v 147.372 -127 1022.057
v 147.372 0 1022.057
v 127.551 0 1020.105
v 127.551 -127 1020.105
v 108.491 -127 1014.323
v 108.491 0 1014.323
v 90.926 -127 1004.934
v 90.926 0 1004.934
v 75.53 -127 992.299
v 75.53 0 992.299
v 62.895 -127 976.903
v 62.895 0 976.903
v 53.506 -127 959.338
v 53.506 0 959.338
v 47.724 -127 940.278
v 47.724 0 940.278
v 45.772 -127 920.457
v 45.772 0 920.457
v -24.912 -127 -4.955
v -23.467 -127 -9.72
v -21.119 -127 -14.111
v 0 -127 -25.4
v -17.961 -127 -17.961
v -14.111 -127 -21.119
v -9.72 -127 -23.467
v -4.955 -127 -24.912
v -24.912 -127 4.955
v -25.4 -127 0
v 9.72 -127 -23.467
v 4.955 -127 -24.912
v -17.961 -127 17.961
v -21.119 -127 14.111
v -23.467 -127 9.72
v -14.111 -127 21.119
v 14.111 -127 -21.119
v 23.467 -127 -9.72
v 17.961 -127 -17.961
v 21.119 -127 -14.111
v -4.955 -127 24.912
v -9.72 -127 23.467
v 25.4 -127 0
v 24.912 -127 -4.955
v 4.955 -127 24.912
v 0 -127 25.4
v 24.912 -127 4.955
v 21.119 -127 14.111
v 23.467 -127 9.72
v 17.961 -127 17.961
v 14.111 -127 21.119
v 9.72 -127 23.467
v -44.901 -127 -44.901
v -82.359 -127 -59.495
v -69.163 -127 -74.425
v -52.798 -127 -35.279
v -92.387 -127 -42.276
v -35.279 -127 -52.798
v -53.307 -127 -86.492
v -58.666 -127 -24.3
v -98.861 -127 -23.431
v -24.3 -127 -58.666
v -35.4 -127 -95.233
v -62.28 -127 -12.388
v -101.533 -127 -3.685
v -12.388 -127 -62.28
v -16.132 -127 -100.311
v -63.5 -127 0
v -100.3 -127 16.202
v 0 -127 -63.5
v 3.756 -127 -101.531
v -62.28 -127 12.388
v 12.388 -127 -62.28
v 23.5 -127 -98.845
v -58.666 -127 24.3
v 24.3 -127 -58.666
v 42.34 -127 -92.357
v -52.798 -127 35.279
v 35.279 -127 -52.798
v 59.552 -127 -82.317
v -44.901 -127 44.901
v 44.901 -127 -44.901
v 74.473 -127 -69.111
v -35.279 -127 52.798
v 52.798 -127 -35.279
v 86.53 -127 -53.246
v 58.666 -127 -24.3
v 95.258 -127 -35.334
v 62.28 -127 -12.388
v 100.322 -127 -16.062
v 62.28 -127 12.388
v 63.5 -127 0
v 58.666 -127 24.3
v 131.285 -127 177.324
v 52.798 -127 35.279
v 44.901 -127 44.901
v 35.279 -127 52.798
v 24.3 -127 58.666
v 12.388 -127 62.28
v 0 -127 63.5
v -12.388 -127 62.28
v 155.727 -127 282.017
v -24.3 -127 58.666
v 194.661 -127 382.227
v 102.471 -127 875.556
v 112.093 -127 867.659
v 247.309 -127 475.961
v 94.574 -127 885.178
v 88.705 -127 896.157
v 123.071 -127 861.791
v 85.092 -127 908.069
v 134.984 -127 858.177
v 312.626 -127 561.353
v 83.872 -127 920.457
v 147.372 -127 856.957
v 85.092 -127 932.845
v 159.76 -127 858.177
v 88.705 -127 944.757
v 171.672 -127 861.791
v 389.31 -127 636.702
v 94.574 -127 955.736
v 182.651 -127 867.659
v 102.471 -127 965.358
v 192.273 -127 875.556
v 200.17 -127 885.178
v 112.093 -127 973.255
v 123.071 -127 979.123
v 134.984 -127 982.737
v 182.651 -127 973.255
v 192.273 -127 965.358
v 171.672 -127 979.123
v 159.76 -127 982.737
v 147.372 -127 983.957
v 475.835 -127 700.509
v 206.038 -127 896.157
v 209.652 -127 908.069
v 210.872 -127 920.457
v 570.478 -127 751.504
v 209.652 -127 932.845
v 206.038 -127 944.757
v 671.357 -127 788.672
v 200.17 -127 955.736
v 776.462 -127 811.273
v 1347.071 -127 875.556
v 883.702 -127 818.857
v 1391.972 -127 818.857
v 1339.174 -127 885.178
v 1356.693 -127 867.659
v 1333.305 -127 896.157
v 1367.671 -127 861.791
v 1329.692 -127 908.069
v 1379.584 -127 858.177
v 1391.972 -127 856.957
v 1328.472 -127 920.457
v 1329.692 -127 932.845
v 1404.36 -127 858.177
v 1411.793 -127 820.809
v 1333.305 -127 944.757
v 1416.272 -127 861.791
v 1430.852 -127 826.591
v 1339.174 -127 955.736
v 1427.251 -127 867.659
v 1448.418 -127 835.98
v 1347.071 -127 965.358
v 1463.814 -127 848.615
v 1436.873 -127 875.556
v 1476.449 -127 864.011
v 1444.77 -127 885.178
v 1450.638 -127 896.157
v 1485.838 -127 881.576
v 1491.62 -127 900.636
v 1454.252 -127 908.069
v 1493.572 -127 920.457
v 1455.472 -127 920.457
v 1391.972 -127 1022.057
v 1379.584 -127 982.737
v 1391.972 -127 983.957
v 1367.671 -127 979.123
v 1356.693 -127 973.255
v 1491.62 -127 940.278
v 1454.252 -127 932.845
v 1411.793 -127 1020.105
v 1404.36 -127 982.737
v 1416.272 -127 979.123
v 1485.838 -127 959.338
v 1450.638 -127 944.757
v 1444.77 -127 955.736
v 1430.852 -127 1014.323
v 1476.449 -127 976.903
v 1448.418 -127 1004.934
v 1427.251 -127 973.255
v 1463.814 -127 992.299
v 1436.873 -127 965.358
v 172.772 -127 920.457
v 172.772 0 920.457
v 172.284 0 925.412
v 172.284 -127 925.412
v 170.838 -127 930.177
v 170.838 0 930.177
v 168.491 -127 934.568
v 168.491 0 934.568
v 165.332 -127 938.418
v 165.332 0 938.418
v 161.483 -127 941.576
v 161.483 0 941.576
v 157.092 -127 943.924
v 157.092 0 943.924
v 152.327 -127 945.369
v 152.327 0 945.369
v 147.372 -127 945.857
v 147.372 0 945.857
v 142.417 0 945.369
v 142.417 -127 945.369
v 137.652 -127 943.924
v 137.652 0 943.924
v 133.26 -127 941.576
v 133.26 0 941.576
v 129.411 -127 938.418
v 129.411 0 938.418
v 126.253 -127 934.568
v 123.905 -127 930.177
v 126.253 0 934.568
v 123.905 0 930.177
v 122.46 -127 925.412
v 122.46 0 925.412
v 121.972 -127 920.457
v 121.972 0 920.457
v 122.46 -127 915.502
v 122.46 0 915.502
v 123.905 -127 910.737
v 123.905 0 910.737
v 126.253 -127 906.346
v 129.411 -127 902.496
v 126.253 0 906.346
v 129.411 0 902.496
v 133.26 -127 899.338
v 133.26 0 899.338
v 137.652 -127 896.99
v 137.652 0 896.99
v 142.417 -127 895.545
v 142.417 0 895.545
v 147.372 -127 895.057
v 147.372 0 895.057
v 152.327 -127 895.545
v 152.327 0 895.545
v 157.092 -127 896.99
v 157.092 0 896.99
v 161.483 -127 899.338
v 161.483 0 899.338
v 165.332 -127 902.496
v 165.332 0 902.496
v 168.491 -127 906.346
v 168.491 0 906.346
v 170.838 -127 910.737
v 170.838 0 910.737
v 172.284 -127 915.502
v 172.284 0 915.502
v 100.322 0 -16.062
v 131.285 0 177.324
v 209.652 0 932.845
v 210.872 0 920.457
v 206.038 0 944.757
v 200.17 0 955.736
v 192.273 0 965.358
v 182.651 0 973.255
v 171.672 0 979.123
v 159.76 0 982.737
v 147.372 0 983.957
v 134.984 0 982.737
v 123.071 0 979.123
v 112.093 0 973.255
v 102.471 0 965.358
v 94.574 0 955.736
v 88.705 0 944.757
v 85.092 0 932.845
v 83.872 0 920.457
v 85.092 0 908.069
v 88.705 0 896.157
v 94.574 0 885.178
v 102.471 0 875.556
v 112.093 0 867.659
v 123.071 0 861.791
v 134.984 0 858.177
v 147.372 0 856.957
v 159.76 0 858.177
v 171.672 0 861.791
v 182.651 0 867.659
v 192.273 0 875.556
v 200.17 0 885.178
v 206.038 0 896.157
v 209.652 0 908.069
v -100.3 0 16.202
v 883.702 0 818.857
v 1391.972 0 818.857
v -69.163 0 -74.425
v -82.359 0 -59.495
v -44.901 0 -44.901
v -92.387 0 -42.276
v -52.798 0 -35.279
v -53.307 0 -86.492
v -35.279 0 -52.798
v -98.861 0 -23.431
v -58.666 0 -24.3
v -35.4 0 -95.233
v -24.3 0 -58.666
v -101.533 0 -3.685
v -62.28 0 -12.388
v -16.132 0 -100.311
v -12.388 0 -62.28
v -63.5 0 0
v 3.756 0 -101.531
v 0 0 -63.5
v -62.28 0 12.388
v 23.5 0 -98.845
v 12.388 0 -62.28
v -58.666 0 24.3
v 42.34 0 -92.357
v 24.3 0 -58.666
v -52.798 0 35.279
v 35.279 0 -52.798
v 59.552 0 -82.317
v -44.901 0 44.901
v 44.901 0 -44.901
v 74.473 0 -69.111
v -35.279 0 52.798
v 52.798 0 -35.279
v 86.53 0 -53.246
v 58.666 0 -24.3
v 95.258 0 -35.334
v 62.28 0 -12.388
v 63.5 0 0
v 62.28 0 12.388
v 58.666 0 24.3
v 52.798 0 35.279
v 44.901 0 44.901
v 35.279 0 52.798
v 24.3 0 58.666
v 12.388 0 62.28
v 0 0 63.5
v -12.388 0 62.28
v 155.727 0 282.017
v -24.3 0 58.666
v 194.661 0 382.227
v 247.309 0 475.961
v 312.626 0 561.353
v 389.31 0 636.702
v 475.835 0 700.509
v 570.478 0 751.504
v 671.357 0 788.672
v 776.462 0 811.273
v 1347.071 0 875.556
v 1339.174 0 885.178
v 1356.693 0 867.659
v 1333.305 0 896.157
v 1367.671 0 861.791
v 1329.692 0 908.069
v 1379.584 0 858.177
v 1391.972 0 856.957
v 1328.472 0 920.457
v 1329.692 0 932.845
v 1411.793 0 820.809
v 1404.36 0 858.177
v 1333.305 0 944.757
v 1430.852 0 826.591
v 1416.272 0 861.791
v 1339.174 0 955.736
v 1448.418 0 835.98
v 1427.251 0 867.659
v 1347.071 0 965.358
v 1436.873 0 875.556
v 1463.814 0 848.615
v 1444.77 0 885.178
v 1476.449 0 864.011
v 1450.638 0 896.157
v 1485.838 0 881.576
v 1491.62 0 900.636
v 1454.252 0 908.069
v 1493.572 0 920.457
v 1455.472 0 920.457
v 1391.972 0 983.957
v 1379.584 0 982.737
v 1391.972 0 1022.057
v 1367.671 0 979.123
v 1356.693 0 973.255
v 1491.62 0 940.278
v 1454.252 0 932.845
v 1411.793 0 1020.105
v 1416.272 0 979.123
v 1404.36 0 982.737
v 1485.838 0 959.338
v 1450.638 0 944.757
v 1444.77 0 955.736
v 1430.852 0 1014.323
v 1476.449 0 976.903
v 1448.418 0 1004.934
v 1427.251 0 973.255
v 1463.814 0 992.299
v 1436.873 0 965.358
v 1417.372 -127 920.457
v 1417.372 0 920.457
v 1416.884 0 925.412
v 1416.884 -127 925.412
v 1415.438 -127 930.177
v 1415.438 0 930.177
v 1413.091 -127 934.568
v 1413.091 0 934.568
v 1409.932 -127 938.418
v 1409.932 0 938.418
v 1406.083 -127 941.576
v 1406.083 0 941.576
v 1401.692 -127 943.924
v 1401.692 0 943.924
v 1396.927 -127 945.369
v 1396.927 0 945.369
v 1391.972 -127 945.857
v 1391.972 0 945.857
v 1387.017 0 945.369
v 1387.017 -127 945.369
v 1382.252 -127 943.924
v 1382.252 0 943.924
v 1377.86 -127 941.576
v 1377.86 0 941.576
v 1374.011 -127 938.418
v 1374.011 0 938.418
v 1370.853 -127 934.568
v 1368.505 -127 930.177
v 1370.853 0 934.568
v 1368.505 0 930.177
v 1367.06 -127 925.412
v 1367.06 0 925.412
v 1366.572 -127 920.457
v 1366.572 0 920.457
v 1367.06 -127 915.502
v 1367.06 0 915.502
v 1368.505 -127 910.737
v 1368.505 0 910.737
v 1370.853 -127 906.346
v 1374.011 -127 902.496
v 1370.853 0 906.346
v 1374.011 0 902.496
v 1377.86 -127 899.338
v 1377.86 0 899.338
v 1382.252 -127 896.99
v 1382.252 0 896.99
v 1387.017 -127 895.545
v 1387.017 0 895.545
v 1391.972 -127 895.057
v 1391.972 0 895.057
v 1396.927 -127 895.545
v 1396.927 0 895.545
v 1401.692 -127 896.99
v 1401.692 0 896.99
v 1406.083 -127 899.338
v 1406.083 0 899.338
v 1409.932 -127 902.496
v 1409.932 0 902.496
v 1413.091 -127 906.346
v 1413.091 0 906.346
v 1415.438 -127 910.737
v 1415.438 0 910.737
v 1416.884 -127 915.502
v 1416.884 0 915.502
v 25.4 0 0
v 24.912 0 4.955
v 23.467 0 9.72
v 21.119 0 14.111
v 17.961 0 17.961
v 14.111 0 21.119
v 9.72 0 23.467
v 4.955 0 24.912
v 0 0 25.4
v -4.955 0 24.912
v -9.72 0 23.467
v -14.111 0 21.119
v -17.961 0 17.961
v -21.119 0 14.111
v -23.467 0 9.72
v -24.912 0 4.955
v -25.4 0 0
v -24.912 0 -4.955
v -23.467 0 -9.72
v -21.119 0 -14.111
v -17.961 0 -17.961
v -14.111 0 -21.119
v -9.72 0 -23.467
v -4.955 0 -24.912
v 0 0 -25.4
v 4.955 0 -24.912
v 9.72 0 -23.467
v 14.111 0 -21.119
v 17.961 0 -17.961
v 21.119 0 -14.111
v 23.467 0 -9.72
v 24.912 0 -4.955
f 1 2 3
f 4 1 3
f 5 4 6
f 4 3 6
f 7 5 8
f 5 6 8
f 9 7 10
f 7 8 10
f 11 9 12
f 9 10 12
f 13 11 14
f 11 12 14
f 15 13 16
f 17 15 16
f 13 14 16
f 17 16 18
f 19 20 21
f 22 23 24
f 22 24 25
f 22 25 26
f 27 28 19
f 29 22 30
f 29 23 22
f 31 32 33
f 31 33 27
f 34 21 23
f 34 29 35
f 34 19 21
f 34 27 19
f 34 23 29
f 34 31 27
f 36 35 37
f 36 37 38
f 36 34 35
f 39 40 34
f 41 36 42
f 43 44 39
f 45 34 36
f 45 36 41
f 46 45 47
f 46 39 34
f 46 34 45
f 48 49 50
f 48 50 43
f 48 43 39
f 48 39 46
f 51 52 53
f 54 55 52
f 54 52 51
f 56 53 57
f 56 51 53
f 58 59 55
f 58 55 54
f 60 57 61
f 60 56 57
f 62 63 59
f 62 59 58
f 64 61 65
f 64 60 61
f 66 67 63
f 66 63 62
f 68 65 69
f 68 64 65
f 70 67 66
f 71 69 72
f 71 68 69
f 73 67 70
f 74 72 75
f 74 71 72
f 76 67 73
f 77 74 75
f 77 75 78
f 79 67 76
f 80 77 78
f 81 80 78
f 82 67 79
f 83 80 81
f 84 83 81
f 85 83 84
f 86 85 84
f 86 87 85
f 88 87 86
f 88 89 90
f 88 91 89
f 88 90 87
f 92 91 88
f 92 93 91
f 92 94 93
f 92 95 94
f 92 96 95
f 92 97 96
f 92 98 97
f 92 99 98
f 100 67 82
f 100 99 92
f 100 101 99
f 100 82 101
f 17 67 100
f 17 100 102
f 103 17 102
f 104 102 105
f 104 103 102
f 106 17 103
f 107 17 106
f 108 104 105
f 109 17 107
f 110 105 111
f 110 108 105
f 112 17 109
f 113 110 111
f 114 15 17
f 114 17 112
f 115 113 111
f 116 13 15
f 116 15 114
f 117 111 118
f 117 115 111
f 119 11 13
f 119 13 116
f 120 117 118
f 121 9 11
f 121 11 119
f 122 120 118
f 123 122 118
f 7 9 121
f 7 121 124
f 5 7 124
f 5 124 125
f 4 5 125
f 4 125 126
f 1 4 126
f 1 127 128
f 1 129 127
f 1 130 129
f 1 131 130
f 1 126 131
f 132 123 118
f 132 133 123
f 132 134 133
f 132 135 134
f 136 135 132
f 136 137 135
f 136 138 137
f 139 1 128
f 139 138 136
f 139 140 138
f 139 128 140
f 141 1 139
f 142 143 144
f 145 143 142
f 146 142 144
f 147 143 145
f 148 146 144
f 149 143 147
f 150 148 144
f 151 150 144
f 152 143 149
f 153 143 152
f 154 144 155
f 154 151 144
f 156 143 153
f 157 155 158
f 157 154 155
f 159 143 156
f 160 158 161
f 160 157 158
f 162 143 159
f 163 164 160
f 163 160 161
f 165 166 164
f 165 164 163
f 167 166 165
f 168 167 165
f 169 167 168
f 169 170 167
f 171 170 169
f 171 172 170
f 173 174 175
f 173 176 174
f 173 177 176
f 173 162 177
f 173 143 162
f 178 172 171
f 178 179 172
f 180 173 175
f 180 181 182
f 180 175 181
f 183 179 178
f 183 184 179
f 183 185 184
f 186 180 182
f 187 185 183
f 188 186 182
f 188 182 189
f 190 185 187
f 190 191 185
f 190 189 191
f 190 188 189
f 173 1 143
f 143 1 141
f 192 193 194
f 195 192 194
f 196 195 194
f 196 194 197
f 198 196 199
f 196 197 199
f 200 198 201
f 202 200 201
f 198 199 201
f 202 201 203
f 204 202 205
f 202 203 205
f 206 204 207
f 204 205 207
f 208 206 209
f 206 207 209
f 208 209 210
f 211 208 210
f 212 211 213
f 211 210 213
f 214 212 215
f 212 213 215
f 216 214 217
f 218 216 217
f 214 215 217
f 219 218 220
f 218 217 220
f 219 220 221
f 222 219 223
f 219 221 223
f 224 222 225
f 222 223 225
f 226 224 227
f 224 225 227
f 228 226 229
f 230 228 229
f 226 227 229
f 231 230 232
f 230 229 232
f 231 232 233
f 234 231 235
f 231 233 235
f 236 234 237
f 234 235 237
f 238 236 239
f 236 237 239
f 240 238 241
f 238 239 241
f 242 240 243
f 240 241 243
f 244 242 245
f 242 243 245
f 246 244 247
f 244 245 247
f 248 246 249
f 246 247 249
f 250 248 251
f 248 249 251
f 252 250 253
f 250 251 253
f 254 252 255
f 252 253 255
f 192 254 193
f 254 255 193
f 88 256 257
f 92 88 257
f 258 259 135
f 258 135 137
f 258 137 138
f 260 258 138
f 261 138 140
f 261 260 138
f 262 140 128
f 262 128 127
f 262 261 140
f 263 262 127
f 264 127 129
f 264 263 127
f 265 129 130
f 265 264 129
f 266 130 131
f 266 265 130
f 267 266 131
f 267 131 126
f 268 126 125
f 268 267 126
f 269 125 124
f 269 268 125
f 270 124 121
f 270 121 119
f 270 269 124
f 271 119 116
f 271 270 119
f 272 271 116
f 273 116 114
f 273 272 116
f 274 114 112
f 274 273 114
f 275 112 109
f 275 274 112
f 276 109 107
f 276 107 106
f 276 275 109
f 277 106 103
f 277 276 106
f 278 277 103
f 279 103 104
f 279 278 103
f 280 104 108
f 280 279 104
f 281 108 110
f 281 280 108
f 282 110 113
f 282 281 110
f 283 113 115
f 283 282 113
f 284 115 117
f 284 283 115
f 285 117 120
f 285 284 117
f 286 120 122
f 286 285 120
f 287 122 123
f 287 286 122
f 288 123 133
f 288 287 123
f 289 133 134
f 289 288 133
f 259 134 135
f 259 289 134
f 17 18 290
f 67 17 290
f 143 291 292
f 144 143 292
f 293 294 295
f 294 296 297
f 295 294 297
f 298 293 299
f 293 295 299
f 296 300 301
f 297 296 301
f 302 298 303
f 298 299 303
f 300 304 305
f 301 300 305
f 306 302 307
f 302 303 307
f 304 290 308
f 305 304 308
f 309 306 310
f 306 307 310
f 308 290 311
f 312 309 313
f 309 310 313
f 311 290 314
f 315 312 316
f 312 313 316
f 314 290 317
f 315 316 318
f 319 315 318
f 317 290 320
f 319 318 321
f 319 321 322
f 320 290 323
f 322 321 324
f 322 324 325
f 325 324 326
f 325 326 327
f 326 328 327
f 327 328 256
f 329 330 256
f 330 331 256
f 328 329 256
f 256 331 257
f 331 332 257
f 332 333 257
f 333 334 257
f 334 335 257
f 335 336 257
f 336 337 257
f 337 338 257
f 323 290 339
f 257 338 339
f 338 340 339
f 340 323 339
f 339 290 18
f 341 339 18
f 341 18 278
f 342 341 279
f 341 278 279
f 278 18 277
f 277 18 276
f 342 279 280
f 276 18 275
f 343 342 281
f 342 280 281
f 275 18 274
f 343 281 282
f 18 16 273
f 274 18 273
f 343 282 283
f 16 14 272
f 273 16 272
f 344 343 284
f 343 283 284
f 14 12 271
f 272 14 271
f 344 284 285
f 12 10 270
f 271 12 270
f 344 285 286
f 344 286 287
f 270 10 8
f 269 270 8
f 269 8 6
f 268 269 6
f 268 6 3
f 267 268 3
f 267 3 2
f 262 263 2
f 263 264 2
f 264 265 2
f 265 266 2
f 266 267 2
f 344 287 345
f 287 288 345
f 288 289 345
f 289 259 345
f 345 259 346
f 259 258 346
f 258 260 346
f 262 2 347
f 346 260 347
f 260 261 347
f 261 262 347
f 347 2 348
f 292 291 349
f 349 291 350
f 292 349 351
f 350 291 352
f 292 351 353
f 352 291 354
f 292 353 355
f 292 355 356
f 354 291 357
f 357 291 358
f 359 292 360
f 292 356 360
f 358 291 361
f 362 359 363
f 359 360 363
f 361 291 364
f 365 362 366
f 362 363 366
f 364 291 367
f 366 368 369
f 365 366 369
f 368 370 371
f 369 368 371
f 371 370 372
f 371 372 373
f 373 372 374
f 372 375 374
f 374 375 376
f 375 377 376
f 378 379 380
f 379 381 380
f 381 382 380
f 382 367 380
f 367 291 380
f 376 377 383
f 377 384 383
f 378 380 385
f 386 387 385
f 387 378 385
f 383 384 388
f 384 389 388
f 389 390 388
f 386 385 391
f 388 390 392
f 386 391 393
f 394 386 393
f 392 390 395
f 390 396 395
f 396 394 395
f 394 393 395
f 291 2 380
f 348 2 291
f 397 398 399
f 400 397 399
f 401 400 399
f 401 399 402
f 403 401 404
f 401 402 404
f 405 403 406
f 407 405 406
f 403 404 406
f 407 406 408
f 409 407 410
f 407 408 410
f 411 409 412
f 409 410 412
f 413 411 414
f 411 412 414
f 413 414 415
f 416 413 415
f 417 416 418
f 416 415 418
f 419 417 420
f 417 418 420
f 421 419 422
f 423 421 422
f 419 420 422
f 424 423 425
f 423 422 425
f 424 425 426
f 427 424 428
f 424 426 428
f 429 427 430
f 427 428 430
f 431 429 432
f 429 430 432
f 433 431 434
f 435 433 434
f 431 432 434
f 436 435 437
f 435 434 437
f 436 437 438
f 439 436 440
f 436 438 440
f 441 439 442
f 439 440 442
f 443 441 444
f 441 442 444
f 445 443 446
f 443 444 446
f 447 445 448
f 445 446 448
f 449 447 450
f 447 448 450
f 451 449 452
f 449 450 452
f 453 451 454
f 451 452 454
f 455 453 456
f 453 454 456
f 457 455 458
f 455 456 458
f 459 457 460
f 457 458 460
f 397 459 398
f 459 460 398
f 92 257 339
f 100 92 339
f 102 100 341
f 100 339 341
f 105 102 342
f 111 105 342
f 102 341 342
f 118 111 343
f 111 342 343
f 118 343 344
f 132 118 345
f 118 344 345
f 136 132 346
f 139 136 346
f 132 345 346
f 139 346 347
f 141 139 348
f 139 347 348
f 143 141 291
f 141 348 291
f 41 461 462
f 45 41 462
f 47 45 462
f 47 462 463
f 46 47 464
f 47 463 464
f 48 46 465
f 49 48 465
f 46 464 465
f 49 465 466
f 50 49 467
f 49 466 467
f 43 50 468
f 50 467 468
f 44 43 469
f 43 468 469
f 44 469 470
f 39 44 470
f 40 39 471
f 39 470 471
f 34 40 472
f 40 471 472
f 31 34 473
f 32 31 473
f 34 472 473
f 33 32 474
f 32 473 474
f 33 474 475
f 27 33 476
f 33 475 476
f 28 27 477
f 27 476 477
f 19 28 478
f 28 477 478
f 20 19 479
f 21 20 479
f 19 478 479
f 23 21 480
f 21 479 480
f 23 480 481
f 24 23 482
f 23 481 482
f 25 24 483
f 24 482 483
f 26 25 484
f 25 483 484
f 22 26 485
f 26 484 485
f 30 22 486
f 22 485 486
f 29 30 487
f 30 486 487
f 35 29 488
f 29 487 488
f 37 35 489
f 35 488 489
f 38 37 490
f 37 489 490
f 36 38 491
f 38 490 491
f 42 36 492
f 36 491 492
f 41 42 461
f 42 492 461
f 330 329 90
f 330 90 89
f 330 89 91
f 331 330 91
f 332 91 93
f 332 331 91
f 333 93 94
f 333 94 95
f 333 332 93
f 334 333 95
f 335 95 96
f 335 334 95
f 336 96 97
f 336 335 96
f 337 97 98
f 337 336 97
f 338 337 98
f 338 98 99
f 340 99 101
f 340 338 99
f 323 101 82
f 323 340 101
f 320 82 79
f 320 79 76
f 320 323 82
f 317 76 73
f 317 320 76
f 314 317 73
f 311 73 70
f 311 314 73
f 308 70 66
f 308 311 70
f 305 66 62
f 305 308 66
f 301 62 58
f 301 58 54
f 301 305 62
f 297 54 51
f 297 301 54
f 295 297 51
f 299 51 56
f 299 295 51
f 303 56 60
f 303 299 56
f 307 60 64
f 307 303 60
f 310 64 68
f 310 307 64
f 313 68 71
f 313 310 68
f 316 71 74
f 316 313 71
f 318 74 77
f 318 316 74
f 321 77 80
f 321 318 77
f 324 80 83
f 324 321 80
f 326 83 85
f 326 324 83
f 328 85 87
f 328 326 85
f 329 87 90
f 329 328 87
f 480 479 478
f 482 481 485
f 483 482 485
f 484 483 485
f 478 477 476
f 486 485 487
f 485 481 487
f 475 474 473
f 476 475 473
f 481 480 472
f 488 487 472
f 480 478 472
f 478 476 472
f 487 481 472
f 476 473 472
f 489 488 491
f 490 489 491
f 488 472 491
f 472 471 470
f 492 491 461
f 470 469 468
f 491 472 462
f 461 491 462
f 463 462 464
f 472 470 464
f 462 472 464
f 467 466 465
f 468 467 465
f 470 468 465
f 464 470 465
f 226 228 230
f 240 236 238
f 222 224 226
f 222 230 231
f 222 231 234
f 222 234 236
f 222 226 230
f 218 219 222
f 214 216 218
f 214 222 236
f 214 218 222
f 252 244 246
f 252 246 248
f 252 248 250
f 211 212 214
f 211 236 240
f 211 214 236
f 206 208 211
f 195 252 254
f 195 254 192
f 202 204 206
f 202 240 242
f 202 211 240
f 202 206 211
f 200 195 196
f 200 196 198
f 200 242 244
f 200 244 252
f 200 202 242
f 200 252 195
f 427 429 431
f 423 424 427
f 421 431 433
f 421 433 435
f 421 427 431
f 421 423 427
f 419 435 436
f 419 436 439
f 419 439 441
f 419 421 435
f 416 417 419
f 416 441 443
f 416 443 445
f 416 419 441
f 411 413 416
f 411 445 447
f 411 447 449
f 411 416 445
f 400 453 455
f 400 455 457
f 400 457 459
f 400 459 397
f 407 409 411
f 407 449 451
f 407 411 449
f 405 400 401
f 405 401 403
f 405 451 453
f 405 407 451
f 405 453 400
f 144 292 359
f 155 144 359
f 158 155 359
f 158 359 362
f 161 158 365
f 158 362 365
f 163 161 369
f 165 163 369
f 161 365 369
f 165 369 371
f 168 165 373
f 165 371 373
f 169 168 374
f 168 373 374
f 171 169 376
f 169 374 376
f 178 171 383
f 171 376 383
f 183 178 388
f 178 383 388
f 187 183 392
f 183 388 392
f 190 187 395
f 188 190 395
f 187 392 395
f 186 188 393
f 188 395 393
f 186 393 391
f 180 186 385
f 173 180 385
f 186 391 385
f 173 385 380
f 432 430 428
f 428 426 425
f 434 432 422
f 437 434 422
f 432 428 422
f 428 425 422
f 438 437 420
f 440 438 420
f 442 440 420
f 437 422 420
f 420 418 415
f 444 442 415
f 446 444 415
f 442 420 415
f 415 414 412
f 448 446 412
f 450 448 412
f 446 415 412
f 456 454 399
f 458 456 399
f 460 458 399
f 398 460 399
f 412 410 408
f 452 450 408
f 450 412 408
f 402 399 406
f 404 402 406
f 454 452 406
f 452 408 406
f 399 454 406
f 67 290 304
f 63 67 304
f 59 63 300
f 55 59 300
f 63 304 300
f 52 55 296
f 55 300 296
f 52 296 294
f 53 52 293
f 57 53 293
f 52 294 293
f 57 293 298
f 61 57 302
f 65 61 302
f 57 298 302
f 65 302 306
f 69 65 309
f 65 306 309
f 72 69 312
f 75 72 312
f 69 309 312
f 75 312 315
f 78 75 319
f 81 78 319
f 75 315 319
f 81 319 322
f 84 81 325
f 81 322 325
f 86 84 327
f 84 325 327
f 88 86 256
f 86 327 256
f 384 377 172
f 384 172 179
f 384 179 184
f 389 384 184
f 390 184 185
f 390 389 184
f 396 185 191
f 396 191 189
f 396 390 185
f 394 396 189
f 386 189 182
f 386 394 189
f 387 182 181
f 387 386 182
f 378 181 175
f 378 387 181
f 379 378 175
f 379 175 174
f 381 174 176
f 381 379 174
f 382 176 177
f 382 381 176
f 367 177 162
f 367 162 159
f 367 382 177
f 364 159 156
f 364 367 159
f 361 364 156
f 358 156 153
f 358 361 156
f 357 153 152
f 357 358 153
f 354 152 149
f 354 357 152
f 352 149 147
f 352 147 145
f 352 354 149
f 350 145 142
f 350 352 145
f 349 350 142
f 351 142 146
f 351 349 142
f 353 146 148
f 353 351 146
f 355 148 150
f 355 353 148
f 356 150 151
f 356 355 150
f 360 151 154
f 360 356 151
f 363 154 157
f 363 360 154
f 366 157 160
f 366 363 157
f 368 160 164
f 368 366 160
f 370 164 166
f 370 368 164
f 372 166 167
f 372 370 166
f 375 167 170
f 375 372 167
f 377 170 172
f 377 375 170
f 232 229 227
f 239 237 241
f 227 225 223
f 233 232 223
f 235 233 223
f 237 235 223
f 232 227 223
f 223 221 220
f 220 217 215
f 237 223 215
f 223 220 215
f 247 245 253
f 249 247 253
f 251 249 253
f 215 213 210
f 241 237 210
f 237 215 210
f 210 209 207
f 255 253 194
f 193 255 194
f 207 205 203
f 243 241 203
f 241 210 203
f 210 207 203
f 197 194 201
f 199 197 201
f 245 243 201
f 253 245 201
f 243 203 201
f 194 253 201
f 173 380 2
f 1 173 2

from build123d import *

# Parameters (mm, degrees)
F0_R     = 63.5
F0_R_2   = 25.4
F1_DEPTH = 127


with BuildPart() as f1:
    # F0 (on Front) → F1 (new body)
    with BuildSketch(Plane.XZ):
        with BuildLine():
            Line((1391.971837, 1022.057003), (147.371837, 1022.057003))
            ThreePointArc((147.371837, 1022.057003), (75.529788, 992.299052), (45.771837, 920.457003))
            Line((45.771837, 920.457003), (-100.299788, 16.20224))
            ThreePointArc((-100.299788, 16.20224), (-16.132287, -100.311063), (100.322289, -16.062326))
            Line((100.322289, -16.062326), (131.284912, 177.324444))
            ThreePointArc((131.284912, 177.324444), (389.309621, 636.701892), (883.702081, 818.857003))
            Line((883.702081, 818.857003), (1391.971837, 818.857003))
            ThreePointArc((1391.971837, 818.857003), (1493.571837, 920.457003), (1391.971837, 1022.057003))
        make_face()
        Circle(F0_R, mode=Mode.SUBTRACT)
        with Locations((147.371837, 920.457003)):
            Circle(F0_R, mode=Mode.SUBTRACT)
        with Locations((1391.971837, 920.457003)):
            Circle(F0_R, mode=Mode.SUBTRACT)
        with Locations((147.371837, 920.457003)):
            Circle(F0_R_2)
        Circle(F0_R_2)
        with Locations((1391.971837, 920.457003)):
            Circle(F0_R_2)
    extrude(amount=F1_DEPTH)


solid = f1.part
